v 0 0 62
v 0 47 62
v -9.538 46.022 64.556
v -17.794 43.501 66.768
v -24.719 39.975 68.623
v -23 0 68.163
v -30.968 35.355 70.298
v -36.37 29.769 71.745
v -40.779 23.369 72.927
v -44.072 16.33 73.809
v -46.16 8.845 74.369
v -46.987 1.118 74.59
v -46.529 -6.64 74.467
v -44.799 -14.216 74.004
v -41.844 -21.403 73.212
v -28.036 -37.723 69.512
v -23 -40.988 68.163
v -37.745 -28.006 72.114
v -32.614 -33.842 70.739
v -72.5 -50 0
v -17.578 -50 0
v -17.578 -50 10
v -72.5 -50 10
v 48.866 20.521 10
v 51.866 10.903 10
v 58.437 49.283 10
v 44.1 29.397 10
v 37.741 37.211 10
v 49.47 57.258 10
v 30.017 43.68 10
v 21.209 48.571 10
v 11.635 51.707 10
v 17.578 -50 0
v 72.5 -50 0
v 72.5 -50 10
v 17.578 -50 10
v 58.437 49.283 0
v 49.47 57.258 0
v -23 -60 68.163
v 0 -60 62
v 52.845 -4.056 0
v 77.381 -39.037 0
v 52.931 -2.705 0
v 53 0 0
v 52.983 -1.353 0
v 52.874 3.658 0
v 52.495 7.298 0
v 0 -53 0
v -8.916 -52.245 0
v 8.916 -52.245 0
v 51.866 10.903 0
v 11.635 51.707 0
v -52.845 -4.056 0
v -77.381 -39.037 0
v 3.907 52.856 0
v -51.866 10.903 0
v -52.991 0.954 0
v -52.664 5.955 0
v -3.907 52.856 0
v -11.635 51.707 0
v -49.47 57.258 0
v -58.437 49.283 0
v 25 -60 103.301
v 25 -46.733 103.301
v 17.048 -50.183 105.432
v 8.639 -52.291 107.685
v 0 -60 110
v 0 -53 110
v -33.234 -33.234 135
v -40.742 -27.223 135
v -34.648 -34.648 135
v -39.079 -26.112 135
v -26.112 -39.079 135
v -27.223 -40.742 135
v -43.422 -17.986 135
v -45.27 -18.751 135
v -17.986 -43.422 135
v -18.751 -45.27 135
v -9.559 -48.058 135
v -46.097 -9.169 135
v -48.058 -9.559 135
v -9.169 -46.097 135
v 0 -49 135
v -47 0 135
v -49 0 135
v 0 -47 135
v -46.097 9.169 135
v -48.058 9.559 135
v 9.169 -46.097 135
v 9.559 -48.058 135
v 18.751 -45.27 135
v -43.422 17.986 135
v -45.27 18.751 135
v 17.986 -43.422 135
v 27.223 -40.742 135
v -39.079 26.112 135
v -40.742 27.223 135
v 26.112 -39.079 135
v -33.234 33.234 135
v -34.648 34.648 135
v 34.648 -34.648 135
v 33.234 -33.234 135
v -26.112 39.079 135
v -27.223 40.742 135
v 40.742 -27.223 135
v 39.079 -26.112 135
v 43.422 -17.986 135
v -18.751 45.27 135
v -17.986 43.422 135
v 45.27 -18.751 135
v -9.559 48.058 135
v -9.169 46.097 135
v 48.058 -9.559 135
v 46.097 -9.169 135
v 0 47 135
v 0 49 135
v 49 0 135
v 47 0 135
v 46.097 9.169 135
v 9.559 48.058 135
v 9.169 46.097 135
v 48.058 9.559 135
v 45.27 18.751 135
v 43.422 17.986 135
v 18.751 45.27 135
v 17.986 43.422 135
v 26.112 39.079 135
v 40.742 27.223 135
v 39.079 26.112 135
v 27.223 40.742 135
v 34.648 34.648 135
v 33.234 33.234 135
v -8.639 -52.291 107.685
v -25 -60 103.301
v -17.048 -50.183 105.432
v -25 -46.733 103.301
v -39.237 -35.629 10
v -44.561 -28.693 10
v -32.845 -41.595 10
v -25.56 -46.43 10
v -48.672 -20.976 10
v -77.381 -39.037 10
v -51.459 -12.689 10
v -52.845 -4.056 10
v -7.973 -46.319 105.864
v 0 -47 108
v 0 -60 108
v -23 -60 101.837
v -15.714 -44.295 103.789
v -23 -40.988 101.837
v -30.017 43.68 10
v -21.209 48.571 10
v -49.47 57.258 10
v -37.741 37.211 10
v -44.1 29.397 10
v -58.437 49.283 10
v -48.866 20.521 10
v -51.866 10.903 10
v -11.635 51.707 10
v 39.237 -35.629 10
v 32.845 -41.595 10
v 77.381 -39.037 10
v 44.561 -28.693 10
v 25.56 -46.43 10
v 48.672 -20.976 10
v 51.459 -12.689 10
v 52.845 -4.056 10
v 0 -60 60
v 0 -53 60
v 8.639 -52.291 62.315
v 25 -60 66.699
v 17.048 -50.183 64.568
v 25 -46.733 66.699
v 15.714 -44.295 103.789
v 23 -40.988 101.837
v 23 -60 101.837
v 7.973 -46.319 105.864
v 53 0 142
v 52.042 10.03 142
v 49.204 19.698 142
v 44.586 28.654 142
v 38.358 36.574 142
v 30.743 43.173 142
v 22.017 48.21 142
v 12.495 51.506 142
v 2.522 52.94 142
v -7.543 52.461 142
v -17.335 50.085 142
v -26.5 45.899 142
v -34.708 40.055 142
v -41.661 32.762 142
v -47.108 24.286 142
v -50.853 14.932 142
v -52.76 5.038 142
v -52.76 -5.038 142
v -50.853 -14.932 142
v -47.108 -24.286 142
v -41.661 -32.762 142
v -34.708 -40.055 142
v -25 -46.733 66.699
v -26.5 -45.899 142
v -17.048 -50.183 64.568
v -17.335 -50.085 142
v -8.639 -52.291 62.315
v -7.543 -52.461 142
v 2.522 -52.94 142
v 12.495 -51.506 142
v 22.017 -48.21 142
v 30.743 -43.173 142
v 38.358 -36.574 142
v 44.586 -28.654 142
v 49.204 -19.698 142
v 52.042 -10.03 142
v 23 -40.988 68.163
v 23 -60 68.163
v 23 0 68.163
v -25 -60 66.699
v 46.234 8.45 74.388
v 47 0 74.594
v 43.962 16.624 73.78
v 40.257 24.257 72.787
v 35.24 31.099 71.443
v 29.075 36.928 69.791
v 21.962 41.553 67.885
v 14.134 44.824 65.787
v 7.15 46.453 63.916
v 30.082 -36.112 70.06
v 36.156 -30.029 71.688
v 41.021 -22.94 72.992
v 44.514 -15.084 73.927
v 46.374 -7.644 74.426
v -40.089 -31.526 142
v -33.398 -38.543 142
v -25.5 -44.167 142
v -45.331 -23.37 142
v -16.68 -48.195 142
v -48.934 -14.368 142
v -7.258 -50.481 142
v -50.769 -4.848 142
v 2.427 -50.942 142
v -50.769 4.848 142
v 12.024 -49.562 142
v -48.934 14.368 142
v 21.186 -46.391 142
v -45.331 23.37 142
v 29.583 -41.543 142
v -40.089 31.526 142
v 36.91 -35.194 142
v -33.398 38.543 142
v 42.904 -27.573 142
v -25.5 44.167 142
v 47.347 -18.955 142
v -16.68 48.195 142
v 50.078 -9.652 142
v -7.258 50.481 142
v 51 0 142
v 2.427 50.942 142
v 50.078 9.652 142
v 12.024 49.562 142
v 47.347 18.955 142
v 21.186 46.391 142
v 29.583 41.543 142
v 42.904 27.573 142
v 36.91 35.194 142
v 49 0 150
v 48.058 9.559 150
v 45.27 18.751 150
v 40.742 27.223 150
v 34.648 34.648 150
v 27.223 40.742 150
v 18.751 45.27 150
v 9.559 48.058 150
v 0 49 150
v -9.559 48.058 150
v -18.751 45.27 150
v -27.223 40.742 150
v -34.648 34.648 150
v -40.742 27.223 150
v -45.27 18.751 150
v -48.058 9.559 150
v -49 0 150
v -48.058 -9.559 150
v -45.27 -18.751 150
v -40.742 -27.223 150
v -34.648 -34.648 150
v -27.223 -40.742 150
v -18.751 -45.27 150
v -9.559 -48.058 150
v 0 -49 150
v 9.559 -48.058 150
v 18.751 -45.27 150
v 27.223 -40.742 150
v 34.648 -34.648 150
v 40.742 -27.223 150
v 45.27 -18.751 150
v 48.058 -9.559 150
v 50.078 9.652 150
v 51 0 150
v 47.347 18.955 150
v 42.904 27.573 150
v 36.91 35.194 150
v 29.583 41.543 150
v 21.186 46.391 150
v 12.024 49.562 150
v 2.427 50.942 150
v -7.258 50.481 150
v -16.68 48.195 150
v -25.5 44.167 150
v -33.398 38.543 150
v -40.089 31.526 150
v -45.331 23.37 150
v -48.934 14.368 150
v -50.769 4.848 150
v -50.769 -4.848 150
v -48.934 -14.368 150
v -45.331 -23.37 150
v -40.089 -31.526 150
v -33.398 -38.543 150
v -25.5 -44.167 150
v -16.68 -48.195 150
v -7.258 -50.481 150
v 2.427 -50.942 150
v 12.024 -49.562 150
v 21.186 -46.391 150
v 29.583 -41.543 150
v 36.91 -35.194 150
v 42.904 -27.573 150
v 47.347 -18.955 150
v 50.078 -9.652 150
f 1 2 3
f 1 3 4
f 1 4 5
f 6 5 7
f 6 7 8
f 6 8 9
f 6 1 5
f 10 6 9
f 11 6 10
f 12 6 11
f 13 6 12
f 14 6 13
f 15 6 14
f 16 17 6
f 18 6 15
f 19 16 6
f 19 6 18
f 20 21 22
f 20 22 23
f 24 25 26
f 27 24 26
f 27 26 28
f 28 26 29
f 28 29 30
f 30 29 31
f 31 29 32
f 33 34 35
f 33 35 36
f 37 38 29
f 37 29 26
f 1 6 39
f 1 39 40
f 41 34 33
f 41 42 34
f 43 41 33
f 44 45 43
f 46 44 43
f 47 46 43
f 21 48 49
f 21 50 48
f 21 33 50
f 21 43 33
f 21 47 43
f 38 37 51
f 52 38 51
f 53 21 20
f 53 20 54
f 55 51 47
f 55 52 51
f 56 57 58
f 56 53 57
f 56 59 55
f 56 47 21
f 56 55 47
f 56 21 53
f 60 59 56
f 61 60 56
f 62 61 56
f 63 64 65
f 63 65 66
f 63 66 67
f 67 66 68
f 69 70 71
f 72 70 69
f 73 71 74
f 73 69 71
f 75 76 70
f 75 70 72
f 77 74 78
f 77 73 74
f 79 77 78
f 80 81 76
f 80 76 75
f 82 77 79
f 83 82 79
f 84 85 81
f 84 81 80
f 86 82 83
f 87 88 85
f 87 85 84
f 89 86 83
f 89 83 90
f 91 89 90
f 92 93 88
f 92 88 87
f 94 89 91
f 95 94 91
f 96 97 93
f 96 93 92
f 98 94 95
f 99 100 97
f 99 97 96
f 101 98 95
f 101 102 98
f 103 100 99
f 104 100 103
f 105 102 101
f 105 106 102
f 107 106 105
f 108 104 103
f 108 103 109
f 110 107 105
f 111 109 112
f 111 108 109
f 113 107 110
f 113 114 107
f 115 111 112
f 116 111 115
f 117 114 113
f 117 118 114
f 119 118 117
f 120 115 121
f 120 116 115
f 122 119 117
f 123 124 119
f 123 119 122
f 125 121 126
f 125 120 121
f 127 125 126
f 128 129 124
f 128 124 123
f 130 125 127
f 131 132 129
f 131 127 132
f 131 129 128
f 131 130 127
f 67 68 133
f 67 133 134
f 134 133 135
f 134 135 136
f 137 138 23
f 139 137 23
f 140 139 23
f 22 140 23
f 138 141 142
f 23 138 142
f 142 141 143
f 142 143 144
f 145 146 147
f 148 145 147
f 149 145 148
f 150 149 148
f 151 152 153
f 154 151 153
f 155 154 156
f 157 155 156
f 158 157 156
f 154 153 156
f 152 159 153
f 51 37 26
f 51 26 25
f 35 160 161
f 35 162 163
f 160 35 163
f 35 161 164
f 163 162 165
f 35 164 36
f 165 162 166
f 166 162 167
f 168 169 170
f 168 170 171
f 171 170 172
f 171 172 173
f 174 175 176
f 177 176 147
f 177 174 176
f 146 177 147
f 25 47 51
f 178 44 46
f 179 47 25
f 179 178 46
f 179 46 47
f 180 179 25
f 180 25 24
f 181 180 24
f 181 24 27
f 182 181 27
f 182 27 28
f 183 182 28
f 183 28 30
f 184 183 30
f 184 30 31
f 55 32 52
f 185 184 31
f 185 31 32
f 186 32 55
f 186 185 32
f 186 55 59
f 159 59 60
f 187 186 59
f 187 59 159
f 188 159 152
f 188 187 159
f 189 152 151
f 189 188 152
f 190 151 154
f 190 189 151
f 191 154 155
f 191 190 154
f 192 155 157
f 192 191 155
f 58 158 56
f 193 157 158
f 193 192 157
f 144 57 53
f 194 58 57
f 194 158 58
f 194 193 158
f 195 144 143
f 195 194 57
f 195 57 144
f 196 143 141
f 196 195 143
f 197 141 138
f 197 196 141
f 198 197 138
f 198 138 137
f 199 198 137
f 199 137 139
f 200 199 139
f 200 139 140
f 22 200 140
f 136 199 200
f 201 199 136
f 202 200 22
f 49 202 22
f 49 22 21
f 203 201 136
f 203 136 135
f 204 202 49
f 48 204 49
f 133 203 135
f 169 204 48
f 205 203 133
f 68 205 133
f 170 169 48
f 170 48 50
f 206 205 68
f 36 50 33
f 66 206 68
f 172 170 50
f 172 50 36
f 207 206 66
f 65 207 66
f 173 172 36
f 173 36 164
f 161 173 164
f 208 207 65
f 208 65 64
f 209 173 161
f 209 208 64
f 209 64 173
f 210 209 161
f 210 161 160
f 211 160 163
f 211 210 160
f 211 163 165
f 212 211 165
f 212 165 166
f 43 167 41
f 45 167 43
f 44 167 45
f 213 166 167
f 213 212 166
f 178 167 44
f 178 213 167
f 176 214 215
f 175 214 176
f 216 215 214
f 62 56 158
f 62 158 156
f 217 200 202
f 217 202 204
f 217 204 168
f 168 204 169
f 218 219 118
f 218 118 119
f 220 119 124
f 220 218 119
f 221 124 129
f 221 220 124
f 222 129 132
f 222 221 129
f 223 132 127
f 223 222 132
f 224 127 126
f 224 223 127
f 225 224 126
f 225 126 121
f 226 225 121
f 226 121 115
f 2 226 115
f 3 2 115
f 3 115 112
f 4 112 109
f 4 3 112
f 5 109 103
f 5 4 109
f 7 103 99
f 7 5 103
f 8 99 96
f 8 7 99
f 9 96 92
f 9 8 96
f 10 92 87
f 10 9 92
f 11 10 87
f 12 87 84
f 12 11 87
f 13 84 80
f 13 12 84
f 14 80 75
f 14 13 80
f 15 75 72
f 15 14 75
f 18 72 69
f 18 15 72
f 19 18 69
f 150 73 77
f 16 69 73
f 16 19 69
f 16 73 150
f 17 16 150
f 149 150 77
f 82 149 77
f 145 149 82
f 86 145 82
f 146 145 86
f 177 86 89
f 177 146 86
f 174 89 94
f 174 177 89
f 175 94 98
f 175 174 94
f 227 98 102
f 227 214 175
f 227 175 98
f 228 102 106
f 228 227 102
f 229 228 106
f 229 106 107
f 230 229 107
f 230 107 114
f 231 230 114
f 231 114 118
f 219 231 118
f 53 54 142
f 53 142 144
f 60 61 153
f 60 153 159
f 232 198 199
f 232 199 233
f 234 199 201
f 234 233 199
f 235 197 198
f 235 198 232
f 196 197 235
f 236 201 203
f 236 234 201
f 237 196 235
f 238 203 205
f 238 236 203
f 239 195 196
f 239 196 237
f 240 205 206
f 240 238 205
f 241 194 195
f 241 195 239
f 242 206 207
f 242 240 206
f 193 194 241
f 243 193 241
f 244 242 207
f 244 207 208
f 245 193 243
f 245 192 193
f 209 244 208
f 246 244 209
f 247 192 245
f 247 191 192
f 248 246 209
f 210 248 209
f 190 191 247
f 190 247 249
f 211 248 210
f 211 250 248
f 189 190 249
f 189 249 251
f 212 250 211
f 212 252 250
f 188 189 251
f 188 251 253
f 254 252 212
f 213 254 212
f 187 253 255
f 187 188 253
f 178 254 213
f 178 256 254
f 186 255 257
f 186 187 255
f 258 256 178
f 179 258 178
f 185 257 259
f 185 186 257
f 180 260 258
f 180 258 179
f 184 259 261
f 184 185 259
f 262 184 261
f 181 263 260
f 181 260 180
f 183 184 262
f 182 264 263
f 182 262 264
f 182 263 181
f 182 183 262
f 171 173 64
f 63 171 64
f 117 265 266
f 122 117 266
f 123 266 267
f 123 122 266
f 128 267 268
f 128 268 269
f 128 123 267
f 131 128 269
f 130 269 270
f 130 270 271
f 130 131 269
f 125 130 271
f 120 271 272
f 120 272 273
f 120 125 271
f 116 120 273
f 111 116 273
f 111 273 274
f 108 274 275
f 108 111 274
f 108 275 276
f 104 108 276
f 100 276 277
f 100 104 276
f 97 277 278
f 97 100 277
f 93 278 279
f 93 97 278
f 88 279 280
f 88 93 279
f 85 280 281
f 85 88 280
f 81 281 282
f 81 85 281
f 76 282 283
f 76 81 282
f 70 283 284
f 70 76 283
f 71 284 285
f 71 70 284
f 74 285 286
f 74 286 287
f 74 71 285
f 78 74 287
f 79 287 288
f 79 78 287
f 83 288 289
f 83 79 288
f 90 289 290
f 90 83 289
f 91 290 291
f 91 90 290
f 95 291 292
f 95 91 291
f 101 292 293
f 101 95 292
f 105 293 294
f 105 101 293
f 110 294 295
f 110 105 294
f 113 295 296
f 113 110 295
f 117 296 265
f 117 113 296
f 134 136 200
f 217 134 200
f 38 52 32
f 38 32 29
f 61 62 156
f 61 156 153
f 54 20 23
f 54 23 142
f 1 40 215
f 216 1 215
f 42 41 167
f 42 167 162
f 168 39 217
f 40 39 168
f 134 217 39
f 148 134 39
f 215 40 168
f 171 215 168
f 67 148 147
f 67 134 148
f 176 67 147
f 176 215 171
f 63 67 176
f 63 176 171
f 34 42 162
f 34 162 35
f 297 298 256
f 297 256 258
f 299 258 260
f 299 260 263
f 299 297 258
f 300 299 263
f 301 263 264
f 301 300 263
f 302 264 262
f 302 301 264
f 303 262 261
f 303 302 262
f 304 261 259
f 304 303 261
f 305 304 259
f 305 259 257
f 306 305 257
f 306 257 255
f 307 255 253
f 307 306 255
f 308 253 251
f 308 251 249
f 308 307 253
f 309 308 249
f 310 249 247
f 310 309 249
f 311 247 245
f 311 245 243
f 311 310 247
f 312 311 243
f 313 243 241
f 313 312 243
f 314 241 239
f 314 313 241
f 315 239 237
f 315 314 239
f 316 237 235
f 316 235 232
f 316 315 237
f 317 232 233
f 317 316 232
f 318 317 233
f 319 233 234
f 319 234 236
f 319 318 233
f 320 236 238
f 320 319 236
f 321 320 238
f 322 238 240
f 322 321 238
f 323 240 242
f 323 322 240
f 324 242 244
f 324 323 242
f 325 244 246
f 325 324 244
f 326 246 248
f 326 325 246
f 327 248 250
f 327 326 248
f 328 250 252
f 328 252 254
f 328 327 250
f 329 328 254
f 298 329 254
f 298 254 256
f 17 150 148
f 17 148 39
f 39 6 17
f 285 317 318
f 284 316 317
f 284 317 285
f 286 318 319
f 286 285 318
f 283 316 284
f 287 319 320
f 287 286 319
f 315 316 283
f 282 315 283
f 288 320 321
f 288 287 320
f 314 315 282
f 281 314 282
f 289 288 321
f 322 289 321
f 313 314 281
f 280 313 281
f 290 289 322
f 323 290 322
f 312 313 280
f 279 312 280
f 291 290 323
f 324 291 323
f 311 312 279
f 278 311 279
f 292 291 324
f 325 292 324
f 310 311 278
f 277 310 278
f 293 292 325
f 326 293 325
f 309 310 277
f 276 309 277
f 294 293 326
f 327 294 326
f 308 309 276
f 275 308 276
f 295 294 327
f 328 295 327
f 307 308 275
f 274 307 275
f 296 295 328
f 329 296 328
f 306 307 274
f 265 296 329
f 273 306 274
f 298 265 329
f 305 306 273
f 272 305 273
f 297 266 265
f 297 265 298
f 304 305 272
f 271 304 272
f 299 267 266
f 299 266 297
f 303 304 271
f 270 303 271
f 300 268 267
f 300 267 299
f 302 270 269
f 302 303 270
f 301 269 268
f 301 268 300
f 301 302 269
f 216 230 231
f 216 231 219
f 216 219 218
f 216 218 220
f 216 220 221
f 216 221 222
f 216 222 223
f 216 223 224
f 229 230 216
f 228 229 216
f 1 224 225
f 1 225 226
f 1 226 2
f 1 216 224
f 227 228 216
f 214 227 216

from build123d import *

# Parameters (mm, degrees)
PAD002_DEPTH  = 60
SKETCH005_R   = 90
SKETCH005_R_2 = 53
PAD004_DEPTH  = 100
PAD003_DEPTH  = 60
SKETCH007_R   = 53
PAD006_DEPTH  = 140
PAD005_DEPTH  = 60
PAD_DEPTH     = 10


with BuildPart() as body002:
    # Sketch003 → Pad002 (new body)
    with BuildSketch(Plane.XZ):
        Polygon((0, 108), (-23, 101.837169), (-23, 68.162831), (0, 62), (23, 68.162831), (23, 101.837169), align=None)
    extrude(amount=PAD002_DEPTH)


with BuildPart() as body:
    # Sketch → Revolution (revolve)
    with BuildSketch(Plane.XZ):
        Polygon((47, 135), (47, 0), (53, 0), (53, 142), (51, 142), (51, 150), (49, 150), (49, 135), align=None)
    revolve(axis=Axis((0, 0, 0), (0, 0, 1)))


with BuildPart() as body004:
    # Sketch005 → Pad004 (new body)
    with BuildSketch(Plane.XY):
        Circle(SKETCH005_R)
        Circle(SKETCH005_R_2, mode=Mode.SUBTRACT)
    extrude(amount=PAD004_DEPTH)


with BuildPart() as fusion:
    # Sketch004 → Pad003 (new body, symmetric)
    with BuildSketch(Plane.XZ):
        Polygon((0, 62), (-57.95555, 77.529143), (-57.95555, 0), (0, 0), (57.95555, 0), (57.95555, 77.529143), align=None)
    extrude(amount=PAD003_DEPTH, both=True)

    # Cut: cut Body004
    add(body004.part, mode=Mode.SUBTRACT)

    # Fusion: union Body
    add(body.part)


with BuildPart() as body006:
    # Sketch007 → Pad006 (new body)
    with BuildSketch(Plane.XY):
        Circle(SKETCH007_R)
    extrude(amount=PAD006_DEPTH)


with BuildPart() as cut002:
    # Sketch006 → Pad005 (new body)
    with BuildSketch(Plane.XZ):
        Polygon((0, 110), (-25, 103.30127), (-25, 66.69873), (0, 60), (25, 66.69873), (25, 103.30127), align=None)
    extrude(amount=PAD005_DEPTH)

    # Cut001: cut Body006
    add(body006.part, mode=Mode.SUBTRACT)

    # Fusion001: union Fusion
    add(fusion.part)

    # Cut002: cut Body002
    add(body002.part, mode=Mode.SUBTRACT)


with BuildPart() as body007:
    # Body007 base: copy of Cut002
    add(cut002.part)

    # Sketch008 → Pad (new body)
    with BuildSketch(Plane.XY):
        Polygon((77.38084, -39.037455), (72.5, -50), (-72.5, -50), (-77.38084, -39.037455), (-50, 0), (-58.436557, 49.283106), (-49.470337, 57.258499), (0, 50), (49.470337, 57.258499), (58.436557, 49.283106), (50, 0), align=None)
    extrude(amount=PAD_DEPTH)


with BuildPart() as fusion002:
    # Fusion002 base: copy of Cut002
    add(cut002.part)

    # Fusion002: union Body007
    add(body007.part)


solid = fusion002.part
